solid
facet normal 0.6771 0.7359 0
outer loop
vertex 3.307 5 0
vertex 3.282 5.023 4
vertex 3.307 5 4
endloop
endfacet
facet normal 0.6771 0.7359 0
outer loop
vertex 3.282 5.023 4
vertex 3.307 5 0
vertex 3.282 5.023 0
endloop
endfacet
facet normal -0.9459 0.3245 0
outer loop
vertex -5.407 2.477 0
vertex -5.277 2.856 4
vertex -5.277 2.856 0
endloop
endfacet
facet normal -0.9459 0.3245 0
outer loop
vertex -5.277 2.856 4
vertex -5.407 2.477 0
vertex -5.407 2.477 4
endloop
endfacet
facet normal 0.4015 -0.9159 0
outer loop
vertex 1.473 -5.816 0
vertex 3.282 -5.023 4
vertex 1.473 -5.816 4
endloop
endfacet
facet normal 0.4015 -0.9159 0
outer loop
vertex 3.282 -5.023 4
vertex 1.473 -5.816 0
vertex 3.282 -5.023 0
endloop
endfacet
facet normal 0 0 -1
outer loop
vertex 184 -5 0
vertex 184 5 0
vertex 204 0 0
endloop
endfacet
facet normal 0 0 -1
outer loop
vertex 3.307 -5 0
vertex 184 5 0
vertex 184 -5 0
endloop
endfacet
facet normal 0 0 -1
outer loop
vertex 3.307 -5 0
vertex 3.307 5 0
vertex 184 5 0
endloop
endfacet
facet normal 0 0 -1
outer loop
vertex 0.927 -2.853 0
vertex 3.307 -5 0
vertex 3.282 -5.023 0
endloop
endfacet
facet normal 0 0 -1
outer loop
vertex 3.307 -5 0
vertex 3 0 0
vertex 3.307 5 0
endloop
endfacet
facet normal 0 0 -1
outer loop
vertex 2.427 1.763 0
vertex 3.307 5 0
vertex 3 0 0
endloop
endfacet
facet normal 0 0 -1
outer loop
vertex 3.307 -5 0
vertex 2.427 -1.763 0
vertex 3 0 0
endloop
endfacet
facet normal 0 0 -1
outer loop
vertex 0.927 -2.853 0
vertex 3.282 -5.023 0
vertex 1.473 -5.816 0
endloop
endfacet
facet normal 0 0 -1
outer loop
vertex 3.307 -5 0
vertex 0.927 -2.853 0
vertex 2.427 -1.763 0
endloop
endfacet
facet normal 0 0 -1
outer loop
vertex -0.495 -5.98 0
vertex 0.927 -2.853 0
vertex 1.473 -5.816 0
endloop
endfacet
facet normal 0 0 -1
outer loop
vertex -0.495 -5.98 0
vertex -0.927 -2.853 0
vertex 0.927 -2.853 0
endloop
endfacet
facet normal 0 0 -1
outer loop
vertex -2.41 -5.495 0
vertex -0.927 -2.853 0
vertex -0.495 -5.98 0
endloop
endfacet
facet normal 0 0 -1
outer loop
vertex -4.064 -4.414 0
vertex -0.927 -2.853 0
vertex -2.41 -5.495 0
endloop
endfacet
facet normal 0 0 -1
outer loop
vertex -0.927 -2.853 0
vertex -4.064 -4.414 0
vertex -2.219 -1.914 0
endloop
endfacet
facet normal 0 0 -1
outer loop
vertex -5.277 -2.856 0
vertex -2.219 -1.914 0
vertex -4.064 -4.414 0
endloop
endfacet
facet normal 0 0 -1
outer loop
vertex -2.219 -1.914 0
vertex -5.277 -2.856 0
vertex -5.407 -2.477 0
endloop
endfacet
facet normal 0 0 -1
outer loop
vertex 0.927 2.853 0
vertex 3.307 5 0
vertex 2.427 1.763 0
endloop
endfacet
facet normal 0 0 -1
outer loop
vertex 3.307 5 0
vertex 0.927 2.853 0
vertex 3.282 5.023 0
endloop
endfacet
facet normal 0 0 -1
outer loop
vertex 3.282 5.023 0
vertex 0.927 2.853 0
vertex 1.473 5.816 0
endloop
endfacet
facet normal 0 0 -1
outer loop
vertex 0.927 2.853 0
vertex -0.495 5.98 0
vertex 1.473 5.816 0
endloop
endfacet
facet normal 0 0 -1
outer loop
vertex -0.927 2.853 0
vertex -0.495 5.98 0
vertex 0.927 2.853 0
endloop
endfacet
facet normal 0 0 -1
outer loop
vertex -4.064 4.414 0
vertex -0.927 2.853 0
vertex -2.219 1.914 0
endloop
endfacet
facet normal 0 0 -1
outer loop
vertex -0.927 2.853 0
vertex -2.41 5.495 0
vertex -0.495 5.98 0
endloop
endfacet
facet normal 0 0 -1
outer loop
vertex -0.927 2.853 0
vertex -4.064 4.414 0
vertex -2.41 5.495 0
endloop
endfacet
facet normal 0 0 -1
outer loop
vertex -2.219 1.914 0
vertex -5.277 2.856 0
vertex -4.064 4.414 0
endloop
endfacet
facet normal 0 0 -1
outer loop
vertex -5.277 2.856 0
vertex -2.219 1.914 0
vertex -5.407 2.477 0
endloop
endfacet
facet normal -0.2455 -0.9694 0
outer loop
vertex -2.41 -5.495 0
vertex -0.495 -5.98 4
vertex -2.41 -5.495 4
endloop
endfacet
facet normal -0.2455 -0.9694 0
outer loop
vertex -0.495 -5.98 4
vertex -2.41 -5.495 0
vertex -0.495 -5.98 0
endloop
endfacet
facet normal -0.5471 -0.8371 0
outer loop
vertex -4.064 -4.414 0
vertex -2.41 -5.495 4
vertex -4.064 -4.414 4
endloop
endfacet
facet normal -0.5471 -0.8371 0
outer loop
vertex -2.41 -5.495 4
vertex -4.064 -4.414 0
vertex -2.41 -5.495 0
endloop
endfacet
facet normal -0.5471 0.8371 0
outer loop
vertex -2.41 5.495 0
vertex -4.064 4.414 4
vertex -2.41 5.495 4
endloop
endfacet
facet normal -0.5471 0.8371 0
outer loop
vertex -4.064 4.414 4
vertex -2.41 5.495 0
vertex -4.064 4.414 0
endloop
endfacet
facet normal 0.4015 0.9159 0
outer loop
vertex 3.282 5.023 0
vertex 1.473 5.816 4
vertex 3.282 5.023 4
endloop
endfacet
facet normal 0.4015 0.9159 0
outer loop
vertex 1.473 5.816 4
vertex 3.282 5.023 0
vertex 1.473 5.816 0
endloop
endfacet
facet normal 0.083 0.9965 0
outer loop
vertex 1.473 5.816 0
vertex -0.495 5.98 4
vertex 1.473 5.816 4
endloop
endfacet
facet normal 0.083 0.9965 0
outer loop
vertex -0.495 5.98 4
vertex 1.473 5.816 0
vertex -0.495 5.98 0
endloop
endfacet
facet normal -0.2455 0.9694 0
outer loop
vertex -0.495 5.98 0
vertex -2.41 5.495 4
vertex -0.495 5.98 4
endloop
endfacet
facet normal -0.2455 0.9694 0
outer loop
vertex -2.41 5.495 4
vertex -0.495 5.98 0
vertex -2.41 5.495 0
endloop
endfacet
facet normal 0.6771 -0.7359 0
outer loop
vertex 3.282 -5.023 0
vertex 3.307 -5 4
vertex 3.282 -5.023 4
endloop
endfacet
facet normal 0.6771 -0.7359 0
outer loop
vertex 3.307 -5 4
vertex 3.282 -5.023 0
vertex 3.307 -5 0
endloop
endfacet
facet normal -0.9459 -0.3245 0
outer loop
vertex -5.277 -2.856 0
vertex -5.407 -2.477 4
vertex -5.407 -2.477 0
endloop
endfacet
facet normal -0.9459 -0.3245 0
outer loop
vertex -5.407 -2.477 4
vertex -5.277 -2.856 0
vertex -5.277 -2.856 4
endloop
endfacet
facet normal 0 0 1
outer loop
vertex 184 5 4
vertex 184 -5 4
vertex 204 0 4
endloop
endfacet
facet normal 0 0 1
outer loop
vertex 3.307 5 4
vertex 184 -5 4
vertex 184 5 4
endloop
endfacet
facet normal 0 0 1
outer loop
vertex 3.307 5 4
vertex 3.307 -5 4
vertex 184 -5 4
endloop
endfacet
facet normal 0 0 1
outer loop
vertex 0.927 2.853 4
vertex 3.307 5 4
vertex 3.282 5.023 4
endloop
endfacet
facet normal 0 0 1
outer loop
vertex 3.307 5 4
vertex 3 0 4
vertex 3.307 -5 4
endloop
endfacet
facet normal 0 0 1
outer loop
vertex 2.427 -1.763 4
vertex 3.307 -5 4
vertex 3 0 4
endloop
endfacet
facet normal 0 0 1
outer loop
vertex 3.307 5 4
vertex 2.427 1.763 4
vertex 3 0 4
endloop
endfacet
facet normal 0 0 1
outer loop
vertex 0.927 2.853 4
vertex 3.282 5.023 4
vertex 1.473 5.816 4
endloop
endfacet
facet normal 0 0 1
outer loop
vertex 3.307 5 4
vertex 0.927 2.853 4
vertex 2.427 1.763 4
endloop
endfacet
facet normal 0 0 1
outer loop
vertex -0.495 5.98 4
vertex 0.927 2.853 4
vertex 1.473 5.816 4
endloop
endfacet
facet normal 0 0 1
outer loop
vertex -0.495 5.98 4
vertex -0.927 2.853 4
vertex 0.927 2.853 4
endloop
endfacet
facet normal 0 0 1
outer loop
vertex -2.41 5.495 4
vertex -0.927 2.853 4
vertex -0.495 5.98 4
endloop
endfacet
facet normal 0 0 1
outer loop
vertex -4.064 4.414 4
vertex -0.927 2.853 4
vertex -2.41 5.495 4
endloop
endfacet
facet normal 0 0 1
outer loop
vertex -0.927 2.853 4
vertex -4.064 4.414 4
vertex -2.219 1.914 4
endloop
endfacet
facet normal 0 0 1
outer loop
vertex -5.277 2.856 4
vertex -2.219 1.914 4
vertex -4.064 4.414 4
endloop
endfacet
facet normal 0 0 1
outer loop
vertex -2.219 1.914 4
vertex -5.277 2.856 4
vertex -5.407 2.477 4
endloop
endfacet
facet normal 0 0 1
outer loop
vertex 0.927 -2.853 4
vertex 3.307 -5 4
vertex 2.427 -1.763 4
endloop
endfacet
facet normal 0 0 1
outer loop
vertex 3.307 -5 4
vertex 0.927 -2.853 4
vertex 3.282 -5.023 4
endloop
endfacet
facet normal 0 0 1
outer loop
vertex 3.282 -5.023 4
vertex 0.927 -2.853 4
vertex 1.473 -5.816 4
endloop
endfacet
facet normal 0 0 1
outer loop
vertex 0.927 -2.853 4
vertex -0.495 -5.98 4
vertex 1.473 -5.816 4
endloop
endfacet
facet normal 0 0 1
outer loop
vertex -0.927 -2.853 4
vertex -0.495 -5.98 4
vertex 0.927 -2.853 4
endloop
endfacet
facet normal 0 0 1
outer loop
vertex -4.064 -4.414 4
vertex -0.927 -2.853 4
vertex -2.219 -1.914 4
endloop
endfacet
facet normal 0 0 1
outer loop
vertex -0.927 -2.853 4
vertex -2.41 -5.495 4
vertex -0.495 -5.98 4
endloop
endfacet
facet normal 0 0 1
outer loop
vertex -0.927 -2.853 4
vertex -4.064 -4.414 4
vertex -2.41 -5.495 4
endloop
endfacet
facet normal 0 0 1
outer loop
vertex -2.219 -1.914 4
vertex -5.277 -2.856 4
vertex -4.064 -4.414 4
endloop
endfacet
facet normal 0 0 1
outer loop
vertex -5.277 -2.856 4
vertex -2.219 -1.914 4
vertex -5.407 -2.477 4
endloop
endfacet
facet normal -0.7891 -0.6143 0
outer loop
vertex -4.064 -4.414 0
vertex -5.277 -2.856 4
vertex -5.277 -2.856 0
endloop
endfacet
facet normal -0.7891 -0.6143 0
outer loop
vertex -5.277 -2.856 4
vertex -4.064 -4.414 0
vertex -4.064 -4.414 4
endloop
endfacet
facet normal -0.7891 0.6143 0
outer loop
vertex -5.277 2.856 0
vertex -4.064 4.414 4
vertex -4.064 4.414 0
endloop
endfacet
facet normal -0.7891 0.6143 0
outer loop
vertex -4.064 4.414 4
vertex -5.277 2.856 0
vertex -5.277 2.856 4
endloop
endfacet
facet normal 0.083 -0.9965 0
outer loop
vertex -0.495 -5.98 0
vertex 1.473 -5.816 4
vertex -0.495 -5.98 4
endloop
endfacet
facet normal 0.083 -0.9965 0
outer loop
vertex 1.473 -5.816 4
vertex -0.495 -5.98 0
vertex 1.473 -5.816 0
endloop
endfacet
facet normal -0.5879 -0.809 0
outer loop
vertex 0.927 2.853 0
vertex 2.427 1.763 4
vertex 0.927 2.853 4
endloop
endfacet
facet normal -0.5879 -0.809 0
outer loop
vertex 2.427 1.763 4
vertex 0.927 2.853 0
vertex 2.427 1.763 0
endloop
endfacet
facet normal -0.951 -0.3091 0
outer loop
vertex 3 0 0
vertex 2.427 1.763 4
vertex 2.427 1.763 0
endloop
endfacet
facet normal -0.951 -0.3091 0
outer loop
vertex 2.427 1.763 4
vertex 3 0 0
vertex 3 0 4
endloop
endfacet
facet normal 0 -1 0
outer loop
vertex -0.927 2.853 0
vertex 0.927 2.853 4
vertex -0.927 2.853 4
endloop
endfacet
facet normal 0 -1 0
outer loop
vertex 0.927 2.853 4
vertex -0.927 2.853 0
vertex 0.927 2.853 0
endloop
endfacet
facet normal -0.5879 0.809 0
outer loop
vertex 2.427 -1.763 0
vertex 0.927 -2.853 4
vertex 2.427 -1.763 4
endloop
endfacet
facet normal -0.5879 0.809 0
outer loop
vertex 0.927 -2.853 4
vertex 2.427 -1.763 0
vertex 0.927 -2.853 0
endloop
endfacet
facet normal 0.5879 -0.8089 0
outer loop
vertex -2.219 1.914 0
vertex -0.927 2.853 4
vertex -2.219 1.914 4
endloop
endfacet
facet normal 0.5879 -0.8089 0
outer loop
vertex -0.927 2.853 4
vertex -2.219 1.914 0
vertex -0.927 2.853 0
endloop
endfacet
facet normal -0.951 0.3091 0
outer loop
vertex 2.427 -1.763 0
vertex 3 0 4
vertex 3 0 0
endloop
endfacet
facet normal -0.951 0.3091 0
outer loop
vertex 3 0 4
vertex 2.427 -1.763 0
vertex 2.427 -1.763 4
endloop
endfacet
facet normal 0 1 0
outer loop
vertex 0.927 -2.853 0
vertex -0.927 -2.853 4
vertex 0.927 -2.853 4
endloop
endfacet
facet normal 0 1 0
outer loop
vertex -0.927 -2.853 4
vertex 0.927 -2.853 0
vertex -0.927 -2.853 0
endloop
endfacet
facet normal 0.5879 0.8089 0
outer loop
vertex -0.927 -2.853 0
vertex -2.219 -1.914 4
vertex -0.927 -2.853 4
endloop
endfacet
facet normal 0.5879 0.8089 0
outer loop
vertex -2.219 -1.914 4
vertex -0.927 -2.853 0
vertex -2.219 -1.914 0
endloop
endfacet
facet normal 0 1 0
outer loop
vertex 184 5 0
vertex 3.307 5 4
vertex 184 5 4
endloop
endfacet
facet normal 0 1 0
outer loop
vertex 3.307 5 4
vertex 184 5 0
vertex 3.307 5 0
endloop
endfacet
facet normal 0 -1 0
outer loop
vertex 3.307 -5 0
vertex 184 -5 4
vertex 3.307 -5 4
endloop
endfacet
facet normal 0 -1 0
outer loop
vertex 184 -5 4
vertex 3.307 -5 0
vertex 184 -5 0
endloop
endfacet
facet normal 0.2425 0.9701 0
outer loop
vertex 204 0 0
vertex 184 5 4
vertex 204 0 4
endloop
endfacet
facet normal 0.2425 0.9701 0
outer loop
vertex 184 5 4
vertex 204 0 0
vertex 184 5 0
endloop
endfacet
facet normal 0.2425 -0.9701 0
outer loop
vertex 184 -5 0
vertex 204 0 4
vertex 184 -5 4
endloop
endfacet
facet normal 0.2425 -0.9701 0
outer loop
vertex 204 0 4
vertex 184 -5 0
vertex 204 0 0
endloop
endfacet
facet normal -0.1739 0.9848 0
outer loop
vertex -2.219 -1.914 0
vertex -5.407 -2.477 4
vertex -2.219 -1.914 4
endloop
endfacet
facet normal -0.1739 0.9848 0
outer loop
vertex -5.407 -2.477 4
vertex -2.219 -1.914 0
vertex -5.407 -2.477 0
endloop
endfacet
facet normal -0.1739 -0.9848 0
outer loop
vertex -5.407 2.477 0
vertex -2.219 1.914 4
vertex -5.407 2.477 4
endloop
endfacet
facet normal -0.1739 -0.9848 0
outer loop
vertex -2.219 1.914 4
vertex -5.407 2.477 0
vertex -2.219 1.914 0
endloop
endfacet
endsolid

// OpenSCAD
// file: ../x-wing-containers/Primitives.scad
module triangular_profile(width, height, depth, points=[[0.5, 0.5],[1, 0], [0, 0]]){
  translate([0, depth, 0]) {
    rotate(90, [1, 0, 0]) {
      linear_extrude(height=depth) {
        polygon(
          points=[
            [width * points[0][0], height * points[0][1]], // top
            [width * points[1][0], height * points[1][1]], // right
            [width * points[2][0], height * points[2][1]] // left
          ], 
          paths=[[0,1,2]]
        );
      }
    }
  }
}
// main file
use <../x-wing-containers/Primitives.scad>

module pin_with_ring_hole_cut(width, depth, height) {
  translate([-width, -depth/2, -1]) {
    cube(size=[width, depth, height + 2]);
  }
}

module pin_with_ring() {
  length = 210;
  radius = 6;
  holeRadius = 6 / 2;
  thickness = 4;
  stemWidth = 10;
  pointLength = 20;

  difference() {
    union() {
      difference() {
        cylinder(r=radius, h=thickness);
    
        translate([0, 0, -1]) {
          cylinder(r=holeRadius, h=thickness + 2);
        }
      }
      
      stemLength = length - radius - holeRadius - pointLength;
    
      translate([holeRadius, -stemWidth/2, 0]) {
        cube(size=[stemLength, 10, thickness]);
      }
      
      translate([holeRadius + stemLength, stemWidth/2, 0]) {
        rotate(90, [1, 0, 0]) {
          triangular_profile(20, stemWidth, thickness, points=[
            [0, 1],[1, 0.5], [0, 0]
          ]);
        }
      }
    }

    

    rotate(10, [0, 0, 1]) {
      pin_with_ring_hole_cut(radius + 1, holeRadius, thickness);
    }

    rotate(-10, [0, 0, 1]) {
      pin_with_ring_hole_cut(radius + 1, holeRadius, thickness);
    }

    //rotate(45, [0, 0, 1]) {
    //  translate([0, 0, -1]) {
    //    cube(size=[1, radius * 2, thickness + 2]);
    //  }
    //}
  }
  
}


pin_with_ring();
